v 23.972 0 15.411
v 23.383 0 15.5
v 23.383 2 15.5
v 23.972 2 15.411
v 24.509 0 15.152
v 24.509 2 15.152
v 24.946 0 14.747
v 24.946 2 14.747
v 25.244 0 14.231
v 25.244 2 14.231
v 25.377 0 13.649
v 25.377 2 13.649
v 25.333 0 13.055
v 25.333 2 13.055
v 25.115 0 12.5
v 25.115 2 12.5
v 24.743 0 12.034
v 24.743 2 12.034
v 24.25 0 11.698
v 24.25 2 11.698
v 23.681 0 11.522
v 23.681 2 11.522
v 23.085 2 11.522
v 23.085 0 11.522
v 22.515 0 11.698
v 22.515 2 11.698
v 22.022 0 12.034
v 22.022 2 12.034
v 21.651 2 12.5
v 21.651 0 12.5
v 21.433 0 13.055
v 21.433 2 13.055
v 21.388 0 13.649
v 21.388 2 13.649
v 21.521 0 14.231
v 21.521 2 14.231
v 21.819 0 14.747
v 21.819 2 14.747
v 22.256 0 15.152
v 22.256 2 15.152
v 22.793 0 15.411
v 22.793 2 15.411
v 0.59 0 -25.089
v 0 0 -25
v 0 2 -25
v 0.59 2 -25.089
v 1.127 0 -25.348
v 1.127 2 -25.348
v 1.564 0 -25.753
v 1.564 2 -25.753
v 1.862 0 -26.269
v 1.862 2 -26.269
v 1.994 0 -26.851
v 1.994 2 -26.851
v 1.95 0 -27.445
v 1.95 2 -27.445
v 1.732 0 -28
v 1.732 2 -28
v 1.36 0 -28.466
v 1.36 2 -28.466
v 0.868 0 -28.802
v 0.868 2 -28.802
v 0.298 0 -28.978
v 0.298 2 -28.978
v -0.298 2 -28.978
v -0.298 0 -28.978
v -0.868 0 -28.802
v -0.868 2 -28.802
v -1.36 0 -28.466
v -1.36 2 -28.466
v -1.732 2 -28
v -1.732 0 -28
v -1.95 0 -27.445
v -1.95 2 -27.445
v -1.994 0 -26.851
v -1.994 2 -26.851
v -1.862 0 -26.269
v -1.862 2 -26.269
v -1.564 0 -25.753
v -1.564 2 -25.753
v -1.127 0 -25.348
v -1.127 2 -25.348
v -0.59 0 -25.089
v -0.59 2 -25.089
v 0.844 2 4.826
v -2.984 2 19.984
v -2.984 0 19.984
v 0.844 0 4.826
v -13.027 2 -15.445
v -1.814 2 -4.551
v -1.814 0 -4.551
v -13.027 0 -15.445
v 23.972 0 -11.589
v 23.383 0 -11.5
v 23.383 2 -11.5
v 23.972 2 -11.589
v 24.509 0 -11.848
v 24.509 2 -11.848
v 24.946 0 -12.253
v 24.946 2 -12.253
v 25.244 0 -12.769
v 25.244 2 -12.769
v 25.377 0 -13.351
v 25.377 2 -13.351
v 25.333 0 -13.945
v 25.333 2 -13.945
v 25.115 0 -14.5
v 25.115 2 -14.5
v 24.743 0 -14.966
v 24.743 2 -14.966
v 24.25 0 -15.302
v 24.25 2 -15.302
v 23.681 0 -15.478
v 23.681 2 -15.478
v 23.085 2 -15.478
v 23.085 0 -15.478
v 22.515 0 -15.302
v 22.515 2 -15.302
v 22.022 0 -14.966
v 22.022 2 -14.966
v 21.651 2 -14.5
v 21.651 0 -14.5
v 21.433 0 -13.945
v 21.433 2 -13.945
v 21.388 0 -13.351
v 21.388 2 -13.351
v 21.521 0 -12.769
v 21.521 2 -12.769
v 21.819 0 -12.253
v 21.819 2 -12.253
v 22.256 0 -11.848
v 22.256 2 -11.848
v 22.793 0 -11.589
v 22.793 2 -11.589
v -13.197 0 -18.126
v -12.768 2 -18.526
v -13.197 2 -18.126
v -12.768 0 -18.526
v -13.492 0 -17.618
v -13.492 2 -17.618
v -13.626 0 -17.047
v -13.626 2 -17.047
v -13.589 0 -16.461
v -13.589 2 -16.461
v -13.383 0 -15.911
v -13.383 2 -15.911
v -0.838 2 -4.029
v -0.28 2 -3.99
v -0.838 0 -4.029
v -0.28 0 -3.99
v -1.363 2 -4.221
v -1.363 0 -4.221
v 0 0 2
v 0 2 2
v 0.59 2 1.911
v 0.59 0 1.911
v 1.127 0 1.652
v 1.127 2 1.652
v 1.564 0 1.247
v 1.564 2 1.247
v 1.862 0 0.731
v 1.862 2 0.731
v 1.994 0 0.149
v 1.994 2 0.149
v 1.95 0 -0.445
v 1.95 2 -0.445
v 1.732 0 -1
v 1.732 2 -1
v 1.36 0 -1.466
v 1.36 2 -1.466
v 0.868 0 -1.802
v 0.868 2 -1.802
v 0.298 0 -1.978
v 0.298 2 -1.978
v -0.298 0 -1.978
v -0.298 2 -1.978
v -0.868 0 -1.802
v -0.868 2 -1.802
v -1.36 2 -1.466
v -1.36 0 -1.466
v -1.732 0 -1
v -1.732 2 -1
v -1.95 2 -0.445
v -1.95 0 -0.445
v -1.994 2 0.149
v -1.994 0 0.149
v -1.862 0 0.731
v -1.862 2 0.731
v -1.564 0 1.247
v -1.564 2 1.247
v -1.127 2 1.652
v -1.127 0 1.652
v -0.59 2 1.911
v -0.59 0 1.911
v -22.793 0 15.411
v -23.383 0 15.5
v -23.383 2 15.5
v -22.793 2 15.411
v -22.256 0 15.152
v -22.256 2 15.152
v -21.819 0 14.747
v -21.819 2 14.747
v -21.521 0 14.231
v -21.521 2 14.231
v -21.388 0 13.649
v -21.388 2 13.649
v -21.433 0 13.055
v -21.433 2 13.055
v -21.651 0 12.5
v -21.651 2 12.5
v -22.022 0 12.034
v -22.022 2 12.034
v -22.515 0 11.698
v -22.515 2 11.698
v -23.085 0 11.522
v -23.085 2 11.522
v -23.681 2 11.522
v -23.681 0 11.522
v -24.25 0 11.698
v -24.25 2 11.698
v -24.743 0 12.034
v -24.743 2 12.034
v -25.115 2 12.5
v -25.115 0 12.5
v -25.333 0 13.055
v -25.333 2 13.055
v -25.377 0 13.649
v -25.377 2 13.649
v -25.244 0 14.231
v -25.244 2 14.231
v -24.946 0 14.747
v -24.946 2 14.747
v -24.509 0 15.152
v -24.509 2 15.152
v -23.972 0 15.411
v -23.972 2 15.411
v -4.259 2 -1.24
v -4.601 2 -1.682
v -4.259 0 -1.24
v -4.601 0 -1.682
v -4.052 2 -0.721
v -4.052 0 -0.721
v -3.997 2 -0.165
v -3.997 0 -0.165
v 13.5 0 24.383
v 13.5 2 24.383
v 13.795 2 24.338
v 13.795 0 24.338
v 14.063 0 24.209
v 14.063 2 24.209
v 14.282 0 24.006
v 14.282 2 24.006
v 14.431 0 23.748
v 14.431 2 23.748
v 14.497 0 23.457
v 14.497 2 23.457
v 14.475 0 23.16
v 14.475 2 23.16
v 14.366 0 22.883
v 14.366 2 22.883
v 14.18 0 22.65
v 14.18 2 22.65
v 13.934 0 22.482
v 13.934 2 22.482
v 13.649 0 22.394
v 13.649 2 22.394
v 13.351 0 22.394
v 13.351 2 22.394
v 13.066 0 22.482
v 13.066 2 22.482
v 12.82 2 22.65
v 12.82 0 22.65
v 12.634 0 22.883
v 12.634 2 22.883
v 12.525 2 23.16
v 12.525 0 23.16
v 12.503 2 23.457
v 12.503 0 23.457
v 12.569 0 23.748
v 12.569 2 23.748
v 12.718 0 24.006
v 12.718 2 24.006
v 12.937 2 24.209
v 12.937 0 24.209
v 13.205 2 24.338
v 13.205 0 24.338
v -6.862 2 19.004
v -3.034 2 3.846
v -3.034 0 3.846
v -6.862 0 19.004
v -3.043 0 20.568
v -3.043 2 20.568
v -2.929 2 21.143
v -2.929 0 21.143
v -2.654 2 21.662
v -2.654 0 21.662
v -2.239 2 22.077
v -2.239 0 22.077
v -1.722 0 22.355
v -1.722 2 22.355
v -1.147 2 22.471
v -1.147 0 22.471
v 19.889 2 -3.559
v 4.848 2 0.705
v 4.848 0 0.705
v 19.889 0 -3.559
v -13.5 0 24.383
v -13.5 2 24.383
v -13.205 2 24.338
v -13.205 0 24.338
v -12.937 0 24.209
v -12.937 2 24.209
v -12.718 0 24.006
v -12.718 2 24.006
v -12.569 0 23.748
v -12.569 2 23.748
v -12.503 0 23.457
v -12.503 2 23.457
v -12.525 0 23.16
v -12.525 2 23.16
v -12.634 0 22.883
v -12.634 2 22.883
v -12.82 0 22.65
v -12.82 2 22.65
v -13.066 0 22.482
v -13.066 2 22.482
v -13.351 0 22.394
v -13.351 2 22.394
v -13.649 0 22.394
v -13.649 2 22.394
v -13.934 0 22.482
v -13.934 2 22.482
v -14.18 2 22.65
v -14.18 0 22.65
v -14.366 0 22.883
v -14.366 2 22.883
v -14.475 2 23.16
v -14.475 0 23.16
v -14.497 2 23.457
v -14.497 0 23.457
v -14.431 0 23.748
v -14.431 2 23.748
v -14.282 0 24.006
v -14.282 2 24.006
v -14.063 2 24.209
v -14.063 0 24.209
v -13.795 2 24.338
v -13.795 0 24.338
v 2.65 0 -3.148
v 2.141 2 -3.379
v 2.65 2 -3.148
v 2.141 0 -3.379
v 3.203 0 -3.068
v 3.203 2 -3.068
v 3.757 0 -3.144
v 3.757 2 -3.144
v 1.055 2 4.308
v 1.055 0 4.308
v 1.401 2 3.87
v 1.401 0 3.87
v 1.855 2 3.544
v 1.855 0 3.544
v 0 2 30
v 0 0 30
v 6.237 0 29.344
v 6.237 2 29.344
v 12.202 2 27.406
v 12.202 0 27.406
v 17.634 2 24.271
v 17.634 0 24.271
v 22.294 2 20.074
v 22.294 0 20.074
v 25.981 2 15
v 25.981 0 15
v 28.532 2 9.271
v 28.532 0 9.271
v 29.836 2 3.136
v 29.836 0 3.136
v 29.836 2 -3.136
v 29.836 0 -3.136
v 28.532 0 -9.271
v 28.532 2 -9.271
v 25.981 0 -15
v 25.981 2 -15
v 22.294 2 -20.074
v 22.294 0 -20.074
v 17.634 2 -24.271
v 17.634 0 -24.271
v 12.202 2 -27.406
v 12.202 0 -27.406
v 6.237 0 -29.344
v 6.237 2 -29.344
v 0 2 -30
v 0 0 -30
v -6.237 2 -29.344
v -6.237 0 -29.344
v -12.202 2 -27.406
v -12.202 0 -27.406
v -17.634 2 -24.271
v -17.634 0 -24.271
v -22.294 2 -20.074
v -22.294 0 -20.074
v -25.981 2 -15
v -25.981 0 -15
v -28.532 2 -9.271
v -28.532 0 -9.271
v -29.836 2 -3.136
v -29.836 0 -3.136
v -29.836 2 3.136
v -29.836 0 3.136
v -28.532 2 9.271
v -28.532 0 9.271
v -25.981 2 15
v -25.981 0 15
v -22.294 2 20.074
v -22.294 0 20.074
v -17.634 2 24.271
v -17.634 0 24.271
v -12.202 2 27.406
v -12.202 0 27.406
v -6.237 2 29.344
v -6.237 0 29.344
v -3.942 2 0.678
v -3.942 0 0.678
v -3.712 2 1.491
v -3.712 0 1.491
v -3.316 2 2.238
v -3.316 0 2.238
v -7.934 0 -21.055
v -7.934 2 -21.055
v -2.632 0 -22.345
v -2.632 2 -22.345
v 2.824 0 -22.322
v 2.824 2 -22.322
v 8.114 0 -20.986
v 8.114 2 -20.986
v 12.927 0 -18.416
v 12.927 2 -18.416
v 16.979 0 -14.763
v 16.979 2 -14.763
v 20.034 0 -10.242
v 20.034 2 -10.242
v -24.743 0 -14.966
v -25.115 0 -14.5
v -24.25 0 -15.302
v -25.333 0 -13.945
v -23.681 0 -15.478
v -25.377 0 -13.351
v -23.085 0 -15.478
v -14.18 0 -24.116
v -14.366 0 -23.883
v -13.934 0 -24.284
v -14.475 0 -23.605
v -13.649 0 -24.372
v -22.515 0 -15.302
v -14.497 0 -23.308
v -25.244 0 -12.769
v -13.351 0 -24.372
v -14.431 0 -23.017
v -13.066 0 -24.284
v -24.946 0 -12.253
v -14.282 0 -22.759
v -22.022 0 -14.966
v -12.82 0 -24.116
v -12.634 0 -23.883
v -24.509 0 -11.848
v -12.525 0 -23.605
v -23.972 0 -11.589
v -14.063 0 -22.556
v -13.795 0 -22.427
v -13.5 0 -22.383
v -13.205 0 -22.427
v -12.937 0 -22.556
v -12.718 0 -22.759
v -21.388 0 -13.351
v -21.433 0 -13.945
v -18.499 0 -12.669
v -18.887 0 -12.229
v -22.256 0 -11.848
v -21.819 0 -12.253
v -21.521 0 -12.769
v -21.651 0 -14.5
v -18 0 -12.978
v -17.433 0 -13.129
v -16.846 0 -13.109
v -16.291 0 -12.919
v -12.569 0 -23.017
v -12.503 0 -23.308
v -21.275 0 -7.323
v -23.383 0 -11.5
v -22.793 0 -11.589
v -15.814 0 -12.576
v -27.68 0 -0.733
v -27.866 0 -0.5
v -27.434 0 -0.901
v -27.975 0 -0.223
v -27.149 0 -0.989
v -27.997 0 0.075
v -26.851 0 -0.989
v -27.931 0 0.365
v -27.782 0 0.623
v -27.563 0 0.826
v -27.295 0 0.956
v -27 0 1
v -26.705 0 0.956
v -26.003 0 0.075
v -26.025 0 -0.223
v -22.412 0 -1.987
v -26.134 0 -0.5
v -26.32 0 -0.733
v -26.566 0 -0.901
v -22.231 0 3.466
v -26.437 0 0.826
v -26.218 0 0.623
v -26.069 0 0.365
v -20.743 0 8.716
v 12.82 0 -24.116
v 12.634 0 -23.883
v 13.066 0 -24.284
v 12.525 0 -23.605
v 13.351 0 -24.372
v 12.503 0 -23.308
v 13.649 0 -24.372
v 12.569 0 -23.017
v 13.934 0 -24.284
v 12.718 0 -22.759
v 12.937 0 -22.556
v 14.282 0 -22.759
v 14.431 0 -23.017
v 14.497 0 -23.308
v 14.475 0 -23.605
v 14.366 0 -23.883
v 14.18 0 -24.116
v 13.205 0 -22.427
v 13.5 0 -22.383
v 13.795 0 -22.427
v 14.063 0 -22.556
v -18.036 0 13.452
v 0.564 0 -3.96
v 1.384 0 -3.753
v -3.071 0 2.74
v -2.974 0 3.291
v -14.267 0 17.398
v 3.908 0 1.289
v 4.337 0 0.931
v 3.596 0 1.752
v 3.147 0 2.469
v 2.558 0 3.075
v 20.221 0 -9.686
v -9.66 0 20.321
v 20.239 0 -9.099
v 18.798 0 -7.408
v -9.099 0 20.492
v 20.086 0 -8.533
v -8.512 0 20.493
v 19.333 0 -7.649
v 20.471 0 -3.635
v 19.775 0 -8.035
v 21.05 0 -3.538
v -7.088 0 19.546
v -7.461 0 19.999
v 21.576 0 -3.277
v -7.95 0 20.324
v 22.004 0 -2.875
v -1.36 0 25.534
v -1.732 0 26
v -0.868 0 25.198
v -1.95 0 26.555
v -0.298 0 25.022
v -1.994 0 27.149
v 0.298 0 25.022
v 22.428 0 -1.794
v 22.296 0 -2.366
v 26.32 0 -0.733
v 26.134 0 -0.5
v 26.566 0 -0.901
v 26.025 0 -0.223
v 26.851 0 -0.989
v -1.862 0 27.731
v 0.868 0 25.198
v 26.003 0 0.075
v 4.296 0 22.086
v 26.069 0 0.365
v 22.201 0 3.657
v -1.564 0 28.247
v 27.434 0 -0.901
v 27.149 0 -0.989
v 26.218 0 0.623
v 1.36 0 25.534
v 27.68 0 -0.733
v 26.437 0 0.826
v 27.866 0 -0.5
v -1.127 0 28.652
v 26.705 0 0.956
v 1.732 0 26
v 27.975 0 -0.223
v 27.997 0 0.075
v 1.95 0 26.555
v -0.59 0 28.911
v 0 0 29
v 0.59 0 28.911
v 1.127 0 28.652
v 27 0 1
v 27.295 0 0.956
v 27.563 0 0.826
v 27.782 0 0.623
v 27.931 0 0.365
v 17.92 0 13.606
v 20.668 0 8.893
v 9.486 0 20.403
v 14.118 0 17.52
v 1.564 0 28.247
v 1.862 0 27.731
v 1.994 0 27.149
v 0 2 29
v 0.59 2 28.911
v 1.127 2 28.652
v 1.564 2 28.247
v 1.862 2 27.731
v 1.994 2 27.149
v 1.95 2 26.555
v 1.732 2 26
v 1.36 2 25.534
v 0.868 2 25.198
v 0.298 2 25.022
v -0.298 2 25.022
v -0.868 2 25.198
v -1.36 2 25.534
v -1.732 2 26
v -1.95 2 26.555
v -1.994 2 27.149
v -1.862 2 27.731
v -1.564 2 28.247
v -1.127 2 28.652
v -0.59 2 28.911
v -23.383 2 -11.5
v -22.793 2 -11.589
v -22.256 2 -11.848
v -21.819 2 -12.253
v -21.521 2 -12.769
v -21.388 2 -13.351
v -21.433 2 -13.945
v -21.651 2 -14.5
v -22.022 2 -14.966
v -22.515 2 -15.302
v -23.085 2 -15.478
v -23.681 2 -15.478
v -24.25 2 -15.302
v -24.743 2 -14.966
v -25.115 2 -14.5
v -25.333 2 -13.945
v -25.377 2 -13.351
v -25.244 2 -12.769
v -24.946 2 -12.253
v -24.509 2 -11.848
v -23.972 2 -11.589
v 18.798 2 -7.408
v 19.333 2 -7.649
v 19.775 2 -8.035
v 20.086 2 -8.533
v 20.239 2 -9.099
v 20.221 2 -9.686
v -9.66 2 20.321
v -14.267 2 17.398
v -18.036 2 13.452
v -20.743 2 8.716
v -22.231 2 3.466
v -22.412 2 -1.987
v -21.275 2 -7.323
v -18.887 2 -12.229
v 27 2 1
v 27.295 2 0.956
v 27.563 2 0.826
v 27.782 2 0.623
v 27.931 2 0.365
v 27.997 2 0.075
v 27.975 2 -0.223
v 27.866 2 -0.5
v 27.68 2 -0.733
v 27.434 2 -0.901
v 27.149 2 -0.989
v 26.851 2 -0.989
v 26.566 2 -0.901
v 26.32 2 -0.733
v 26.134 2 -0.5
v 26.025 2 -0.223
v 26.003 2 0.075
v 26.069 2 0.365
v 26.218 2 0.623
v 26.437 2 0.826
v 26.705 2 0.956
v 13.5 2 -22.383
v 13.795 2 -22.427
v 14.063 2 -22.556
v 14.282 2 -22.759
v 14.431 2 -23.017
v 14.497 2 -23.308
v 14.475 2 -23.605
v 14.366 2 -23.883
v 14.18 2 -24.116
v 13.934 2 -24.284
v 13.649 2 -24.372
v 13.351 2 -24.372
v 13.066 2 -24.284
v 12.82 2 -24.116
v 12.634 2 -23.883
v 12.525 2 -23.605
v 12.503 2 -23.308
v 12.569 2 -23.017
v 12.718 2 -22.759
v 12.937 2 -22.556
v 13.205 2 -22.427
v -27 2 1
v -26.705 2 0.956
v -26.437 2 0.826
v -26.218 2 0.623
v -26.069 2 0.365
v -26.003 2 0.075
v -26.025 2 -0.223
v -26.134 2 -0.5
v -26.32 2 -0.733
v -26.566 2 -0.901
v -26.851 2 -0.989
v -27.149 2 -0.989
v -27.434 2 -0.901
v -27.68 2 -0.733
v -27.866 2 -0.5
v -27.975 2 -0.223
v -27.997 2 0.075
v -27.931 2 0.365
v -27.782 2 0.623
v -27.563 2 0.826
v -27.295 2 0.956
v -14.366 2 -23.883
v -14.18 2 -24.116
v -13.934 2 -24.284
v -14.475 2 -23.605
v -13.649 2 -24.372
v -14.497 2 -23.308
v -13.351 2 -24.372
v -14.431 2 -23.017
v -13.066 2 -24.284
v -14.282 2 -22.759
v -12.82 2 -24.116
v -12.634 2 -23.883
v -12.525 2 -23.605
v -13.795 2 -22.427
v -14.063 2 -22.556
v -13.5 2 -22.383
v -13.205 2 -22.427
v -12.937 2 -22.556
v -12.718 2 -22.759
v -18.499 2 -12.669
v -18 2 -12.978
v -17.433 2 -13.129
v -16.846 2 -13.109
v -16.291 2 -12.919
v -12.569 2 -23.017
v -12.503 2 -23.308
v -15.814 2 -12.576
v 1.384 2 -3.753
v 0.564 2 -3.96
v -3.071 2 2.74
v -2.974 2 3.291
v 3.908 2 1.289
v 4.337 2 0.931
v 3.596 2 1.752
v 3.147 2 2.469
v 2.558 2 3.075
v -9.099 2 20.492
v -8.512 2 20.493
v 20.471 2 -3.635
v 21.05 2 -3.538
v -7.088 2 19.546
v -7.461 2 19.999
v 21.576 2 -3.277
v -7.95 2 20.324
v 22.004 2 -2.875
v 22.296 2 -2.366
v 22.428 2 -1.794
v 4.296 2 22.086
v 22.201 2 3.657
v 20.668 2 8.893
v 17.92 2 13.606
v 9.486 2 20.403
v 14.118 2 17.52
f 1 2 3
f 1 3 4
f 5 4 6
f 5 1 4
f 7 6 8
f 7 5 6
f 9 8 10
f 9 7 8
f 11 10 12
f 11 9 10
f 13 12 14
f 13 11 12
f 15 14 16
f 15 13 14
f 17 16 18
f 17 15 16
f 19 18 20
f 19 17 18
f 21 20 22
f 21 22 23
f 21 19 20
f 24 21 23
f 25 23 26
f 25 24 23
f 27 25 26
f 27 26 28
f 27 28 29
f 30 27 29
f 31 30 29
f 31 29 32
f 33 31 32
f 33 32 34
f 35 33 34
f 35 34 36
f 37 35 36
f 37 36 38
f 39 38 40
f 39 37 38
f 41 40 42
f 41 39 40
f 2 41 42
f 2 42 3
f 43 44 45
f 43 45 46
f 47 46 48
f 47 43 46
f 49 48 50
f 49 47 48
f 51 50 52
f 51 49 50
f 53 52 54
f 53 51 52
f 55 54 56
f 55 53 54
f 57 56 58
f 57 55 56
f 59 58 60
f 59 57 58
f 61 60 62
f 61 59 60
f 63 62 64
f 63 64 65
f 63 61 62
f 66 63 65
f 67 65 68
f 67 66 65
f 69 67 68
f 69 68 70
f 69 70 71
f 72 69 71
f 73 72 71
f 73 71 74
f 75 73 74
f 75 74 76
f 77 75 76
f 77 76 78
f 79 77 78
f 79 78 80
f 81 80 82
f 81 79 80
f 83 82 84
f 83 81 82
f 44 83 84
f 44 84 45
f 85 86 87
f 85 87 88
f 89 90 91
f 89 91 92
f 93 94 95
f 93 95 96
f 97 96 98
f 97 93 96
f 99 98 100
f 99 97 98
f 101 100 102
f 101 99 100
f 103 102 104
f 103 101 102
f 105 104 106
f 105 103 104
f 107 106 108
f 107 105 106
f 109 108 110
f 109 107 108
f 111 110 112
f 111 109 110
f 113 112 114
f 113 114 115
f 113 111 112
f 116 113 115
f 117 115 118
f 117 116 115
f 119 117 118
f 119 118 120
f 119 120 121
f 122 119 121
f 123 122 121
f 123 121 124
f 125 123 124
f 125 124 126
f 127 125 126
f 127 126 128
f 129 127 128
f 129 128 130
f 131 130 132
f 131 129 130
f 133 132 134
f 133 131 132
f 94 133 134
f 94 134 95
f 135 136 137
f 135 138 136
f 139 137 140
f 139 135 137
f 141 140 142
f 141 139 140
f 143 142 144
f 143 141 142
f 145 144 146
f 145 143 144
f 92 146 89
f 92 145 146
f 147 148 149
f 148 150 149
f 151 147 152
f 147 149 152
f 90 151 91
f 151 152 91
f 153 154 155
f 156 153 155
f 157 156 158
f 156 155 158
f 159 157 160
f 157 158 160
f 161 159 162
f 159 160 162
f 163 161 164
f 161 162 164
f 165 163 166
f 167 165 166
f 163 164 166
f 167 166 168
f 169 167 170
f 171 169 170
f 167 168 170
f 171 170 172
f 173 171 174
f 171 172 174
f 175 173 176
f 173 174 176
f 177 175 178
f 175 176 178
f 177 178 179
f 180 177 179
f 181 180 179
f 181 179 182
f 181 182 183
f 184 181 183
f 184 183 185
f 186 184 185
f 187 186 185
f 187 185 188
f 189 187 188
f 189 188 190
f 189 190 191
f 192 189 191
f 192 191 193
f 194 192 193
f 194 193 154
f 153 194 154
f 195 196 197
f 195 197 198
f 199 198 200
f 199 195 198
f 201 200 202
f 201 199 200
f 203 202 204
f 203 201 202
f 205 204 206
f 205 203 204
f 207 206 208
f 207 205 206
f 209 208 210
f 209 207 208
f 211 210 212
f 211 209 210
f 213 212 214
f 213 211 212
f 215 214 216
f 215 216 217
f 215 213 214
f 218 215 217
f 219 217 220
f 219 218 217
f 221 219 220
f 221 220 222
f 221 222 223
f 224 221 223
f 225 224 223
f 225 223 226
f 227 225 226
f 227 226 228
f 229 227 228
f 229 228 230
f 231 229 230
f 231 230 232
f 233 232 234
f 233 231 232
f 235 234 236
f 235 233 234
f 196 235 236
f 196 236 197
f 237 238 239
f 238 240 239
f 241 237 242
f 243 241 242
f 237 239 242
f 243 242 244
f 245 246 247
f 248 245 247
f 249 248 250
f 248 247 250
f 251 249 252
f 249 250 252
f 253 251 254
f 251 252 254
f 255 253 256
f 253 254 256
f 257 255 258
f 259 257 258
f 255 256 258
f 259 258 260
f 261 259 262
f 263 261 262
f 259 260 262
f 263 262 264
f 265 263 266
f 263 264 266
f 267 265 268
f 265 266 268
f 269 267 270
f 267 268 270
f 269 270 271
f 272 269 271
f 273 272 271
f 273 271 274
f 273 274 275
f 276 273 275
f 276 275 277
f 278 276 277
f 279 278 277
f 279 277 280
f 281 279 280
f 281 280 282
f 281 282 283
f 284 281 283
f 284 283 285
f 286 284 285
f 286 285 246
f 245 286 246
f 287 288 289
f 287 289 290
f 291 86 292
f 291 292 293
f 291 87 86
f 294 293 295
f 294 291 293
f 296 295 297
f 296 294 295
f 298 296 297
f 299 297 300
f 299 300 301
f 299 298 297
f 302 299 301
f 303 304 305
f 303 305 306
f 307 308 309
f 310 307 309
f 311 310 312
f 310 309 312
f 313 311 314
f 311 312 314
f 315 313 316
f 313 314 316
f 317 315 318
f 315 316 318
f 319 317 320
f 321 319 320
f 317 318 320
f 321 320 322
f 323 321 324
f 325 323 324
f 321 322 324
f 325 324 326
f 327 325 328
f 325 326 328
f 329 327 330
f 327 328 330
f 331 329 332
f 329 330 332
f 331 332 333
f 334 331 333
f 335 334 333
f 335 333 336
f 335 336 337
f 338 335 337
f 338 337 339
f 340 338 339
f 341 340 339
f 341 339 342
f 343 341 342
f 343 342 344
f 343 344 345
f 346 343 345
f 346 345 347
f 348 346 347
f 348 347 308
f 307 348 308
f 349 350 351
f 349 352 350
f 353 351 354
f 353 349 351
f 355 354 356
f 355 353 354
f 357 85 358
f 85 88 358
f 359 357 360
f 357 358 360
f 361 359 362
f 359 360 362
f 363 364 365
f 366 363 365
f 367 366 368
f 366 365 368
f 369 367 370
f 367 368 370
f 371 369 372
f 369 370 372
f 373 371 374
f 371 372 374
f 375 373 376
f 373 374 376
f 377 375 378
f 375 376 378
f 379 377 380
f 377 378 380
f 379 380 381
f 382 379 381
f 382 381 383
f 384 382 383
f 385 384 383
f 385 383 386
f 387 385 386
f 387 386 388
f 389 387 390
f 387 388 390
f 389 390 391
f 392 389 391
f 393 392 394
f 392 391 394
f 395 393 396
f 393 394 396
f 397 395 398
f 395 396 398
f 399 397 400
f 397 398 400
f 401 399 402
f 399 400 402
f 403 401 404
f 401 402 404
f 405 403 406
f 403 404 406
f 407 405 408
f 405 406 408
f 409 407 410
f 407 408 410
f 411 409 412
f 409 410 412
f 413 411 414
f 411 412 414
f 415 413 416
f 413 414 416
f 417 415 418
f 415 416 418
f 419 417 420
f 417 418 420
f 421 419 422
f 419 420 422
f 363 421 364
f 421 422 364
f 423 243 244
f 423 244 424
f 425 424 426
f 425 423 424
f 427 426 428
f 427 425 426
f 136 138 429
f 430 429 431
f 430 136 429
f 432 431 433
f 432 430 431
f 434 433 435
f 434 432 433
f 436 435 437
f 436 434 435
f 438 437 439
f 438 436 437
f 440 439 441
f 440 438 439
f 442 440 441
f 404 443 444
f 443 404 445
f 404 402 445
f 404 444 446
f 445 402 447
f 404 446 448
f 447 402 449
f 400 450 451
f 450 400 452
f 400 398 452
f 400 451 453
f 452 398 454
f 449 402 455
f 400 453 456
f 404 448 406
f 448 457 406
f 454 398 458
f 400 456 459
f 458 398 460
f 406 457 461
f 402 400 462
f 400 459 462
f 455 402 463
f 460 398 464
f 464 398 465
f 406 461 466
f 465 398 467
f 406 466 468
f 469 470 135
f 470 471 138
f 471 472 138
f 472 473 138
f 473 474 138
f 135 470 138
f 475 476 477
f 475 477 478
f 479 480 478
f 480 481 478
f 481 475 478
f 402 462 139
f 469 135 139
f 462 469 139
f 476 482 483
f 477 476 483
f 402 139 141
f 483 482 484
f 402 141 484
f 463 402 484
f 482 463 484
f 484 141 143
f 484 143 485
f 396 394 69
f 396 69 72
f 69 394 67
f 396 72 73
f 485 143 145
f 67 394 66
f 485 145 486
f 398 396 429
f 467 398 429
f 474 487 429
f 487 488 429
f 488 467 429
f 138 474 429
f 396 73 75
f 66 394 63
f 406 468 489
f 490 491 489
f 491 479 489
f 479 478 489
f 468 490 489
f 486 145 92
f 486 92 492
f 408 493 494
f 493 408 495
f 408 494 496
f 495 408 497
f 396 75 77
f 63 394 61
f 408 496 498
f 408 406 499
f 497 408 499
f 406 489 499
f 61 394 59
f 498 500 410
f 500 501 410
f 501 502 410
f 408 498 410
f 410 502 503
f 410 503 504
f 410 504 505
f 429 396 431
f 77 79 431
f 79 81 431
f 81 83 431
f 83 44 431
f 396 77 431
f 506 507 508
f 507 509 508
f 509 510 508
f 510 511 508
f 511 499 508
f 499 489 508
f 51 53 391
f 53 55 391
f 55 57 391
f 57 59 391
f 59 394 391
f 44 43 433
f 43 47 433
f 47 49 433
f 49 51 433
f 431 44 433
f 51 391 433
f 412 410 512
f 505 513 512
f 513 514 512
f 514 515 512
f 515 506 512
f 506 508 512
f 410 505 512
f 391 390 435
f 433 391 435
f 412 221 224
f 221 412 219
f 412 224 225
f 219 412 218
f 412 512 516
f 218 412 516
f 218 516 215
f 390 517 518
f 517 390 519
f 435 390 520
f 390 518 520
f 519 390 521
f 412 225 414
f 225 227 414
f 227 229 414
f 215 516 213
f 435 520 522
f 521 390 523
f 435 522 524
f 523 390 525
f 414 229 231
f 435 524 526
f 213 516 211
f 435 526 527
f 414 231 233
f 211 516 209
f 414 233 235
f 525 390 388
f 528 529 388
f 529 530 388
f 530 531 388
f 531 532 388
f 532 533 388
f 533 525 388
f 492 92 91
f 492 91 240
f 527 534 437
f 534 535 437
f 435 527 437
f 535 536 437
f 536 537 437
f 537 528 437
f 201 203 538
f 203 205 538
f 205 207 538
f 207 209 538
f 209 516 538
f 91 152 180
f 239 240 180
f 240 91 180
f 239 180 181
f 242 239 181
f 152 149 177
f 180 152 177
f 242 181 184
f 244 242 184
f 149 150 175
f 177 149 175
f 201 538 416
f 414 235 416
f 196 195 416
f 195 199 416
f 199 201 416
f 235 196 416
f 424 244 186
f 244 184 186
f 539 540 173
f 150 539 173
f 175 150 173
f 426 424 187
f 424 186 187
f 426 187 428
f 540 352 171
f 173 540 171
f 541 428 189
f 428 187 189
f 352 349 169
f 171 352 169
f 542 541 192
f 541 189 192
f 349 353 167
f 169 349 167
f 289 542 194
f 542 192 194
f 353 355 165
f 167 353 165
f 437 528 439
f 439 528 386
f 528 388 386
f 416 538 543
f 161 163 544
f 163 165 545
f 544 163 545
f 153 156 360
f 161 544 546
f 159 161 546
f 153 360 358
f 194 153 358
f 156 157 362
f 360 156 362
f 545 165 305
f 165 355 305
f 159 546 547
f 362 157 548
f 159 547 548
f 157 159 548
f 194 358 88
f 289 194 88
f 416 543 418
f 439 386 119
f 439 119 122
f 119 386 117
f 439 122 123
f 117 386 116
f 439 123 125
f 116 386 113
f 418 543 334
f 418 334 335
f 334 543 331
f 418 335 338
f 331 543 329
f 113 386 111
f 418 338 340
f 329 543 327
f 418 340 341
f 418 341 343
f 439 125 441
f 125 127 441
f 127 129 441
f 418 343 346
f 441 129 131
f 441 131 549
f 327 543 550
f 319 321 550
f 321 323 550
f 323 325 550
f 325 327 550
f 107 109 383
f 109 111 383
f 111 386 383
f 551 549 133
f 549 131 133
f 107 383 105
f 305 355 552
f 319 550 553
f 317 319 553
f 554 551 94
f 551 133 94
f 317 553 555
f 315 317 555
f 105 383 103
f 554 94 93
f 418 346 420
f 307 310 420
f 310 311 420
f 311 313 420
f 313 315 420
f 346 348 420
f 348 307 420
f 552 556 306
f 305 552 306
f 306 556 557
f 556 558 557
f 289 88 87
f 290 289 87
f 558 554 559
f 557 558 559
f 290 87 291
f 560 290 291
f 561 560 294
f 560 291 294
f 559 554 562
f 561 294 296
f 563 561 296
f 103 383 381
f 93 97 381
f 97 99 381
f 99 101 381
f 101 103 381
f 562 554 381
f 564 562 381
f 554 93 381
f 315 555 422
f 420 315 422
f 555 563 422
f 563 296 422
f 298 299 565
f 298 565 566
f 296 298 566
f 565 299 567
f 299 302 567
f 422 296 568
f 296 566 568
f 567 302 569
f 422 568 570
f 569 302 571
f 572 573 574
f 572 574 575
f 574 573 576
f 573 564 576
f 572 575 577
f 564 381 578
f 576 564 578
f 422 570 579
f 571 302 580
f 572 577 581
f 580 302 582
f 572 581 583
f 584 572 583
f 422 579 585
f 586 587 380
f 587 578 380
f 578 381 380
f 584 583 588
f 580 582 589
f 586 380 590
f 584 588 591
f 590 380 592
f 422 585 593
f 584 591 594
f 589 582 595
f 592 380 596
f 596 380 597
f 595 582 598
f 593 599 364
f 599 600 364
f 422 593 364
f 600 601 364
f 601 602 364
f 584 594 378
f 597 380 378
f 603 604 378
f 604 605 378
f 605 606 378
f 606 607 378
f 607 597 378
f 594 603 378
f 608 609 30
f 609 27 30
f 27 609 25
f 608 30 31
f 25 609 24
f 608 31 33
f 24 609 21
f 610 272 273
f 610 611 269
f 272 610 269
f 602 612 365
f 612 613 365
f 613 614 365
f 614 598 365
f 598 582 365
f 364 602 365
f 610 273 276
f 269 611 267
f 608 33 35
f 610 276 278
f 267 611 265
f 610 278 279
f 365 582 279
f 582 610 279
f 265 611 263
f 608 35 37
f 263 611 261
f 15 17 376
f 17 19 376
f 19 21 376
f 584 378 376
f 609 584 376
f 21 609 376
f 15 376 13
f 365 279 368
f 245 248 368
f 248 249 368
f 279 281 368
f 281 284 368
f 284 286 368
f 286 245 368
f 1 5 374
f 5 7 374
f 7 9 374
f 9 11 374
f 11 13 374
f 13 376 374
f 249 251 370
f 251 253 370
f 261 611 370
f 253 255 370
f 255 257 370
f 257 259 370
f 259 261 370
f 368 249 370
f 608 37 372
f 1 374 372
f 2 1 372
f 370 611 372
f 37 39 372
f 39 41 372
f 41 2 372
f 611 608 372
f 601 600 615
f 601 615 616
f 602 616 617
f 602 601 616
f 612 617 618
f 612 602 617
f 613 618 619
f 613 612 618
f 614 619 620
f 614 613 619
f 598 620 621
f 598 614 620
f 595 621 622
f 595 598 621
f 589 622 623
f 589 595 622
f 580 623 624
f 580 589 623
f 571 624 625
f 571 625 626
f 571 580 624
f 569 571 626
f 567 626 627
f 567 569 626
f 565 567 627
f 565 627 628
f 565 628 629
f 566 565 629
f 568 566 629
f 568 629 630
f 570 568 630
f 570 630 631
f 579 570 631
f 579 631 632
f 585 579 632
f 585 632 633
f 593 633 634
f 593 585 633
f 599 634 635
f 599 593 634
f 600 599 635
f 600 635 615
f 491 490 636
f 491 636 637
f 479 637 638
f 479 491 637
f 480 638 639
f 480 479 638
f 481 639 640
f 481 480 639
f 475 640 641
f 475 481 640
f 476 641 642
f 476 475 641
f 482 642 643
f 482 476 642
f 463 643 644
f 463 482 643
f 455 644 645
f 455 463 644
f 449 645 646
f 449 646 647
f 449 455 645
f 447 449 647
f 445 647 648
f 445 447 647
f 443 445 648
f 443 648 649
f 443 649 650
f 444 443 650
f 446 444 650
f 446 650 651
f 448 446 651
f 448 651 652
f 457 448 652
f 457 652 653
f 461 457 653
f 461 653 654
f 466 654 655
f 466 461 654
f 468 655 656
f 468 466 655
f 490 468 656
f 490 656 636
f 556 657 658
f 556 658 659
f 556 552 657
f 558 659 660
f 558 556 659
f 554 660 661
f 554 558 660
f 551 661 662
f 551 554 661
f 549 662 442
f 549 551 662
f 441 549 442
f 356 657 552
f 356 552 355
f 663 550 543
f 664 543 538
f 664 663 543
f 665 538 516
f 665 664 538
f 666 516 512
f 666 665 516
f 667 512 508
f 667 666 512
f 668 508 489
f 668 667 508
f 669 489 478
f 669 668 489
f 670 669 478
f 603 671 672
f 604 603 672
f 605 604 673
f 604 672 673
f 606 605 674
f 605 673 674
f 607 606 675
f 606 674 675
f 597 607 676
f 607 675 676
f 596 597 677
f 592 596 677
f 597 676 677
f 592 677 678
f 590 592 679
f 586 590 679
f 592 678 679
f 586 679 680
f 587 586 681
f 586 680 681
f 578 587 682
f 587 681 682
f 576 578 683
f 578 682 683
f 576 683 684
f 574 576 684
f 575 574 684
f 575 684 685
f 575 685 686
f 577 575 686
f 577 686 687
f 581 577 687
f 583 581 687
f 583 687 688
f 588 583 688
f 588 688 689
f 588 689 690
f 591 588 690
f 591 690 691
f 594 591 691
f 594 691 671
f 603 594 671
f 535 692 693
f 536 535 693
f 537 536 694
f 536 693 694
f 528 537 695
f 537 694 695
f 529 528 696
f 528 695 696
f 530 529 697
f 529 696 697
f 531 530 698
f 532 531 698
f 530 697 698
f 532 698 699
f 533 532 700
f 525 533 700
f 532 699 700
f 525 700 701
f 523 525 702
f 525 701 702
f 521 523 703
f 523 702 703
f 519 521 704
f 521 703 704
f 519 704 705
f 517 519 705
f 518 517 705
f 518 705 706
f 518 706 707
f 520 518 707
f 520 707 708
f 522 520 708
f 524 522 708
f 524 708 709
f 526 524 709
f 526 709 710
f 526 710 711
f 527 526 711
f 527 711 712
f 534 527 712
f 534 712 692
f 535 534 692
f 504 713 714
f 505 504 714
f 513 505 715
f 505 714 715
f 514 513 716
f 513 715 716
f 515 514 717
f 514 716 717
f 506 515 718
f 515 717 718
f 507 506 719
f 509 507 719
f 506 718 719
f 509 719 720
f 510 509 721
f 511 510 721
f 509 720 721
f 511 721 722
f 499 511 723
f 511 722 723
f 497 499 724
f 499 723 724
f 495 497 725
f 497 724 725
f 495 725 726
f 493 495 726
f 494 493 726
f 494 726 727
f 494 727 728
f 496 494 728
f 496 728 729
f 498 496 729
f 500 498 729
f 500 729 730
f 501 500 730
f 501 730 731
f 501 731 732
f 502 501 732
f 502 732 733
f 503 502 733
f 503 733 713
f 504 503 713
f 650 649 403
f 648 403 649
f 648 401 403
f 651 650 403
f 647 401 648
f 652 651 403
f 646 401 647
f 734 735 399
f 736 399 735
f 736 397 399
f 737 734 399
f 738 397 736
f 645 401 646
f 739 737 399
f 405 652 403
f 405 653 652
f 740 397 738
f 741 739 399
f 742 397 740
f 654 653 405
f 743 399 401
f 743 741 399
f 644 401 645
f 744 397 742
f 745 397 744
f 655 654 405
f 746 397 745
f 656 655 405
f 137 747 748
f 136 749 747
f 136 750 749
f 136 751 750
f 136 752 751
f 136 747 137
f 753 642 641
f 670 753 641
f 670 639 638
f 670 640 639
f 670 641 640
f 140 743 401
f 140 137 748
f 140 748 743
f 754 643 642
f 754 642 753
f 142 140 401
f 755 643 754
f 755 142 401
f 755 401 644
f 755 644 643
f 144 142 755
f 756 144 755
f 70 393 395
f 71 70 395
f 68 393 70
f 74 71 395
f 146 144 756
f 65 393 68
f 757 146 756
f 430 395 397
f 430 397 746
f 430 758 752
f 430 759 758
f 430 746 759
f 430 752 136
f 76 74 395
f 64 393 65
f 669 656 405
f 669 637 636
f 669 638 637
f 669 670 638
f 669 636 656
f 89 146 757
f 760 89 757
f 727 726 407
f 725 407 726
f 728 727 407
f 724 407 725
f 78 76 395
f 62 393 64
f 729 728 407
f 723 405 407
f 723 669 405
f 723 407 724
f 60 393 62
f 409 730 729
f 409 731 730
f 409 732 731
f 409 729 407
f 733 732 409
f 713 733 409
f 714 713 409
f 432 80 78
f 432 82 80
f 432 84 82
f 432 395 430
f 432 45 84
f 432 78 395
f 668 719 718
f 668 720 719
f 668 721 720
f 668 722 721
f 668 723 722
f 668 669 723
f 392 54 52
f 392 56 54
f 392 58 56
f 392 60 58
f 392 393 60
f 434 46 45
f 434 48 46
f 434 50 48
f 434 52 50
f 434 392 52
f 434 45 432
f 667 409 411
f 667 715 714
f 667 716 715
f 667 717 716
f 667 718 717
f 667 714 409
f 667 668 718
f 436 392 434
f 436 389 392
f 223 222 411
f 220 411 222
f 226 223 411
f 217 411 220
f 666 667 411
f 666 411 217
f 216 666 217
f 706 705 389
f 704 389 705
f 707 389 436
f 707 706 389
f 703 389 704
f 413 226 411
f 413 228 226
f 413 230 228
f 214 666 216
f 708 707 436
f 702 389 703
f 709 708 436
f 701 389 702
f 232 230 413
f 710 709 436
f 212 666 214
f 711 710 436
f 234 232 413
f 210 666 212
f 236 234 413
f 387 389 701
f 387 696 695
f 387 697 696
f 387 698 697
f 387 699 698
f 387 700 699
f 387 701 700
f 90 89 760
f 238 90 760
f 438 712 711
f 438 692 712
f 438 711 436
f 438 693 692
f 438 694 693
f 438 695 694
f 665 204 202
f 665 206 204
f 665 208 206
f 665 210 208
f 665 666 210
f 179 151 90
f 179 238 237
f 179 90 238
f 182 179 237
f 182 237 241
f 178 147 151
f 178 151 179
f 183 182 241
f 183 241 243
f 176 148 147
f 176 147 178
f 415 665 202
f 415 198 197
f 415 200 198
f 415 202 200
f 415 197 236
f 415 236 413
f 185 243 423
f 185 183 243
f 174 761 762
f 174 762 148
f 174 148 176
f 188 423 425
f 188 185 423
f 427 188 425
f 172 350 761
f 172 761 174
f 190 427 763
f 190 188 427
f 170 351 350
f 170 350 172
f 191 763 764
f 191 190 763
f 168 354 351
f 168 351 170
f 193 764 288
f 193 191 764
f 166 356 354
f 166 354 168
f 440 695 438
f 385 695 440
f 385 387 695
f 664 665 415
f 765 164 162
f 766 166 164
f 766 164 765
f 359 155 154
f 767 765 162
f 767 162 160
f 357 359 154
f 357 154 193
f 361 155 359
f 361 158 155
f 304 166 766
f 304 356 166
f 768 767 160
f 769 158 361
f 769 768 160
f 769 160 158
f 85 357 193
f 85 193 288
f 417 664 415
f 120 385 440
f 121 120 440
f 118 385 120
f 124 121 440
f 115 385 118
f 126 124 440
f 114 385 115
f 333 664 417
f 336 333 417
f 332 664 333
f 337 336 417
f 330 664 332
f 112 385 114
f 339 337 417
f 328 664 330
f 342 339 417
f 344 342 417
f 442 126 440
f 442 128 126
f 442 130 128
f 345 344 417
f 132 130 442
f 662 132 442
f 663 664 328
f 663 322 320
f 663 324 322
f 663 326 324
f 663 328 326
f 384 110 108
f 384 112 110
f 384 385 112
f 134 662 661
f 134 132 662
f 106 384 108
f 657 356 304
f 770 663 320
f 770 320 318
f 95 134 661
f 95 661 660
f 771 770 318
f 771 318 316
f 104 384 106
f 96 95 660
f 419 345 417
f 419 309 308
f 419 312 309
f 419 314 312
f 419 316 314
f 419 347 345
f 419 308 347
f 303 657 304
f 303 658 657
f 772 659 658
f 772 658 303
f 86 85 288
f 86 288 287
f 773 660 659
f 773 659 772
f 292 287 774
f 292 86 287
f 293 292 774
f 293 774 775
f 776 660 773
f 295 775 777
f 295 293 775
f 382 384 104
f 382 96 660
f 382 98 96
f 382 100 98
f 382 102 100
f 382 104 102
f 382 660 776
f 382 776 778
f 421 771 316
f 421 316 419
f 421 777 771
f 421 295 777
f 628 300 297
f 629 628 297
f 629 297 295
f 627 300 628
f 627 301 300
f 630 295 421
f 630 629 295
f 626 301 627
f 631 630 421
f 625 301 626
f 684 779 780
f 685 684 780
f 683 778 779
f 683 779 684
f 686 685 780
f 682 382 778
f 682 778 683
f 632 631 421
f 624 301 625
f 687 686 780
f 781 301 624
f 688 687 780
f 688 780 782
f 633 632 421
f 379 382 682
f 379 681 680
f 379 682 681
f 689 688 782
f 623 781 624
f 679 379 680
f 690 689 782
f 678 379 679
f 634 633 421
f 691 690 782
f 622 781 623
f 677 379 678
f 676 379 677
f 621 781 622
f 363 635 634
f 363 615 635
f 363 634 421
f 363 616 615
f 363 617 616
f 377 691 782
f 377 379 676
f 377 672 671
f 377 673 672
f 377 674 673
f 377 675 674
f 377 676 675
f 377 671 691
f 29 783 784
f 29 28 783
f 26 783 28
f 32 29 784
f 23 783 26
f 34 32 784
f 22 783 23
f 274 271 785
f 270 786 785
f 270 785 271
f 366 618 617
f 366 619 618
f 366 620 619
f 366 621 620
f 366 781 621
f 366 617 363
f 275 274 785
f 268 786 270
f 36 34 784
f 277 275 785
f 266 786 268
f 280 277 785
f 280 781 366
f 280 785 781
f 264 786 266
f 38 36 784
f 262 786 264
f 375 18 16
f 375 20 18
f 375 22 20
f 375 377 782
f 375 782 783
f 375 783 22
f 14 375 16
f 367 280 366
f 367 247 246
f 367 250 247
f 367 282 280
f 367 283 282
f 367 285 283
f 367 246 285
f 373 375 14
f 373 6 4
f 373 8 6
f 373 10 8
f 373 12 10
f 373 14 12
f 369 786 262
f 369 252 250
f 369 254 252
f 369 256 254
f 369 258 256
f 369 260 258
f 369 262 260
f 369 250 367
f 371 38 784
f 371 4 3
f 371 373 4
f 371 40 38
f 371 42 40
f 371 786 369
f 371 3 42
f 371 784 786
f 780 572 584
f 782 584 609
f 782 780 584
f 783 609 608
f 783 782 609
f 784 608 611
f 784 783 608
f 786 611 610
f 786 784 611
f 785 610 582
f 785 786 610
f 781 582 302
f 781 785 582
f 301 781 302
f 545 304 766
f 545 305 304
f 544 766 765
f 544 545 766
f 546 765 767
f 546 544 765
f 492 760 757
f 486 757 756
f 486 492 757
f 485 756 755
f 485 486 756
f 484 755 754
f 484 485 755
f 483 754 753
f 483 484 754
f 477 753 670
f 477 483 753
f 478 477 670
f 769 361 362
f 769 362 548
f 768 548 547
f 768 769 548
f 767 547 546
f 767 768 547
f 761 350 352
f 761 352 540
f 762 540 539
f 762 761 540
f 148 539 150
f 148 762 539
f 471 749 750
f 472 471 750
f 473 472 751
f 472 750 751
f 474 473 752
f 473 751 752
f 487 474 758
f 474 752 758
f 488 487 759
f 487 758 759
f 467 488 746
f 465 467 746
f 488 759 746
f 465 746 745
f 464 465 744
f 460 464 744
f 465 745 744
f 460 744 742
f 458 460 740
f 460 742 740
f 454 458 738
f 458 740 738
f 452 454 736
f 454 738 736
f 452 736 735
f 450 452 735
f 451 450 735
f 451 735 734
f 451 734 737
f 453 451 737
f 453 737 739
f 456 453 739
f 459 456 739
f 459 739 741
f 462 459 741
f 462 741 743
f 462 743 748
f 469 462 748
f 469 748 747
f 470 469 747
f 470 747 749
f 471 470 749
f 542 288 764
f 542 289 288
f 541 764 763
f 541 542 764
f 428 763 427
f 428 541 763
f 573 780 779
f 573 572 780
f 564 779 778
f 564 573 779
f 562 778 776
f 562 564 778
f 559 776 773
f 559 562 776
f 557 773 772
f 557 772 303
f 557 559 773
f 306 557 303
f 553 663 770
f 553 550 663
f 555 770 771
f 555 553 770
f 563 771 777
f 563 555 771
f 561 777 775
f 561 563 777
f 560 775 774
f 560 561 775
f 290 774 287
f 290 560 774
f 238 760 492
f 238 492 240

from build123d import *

# Parameters (mm, degrees)
SKETCH1_R                = 30
SKETCH1_R_2              = 2
BOSS_EXTRUDE1_DEPTH      = 2
SKETCH3_R                = 1
CUT_EXTRUDE1_DEPTH       = 3
SKETCH4_R                = 2
CUT_EXTRUDE2_DEPTH       = 10
FILLET1_R                = 2
CIRPATTERN1_COUNT        = 3
FILLET1_OF_CIRPATTERN1_R = 2


with BuildPart() as part:
    # Sketch1 → Boss-Extrude1 (new body)
    with BuildSketch(Plane(origin=(0, 0, 0), x_dir=(1, 0, 0), z_dir=(0, 1, 0))):
        with Locations(Location((0, 0, 0), (0, 0, 270))):
            Circle(SKETCH1_R)
        with Locations(Location((0, 27, 0), (0, 0, 270))):
            Circle(SKETCH1_R_2, mode=Mode.SUBTRACT)
        with Locations(Location((23.382685902, 13.5, 0), (0, 0, 270))):
            Circle(SKETCH1_R_2, mode=Mode.SUBTRACT)
        with Locations(Location((23.382685902, -13.5, 0), (0, 0, 270))):
            Circle(SKETCH1_R_2, mode=Mode.SUBTRACT)
        with Locations(Location((0, -27, 0), (0, 0, 270))):
            Circle(SKETCH1_R_2, mode=Mode.SUBTRACT)
        with Locations(Location((-23.382685902, -13.5, 0), (0, 0, 270))):
            Circle(SKETCH1_R_2, mode=Mode.SUBTRACT)
        with Locations(Location((-23.382685902, 13.5, 0), (0, 0, 270))):
            Circle(SKETCH1_R_2, mode=Mode.SUBTRACT)
    extrude(amount=BOSS_EXTRUDE1_DEPTH)

    # Sketch3 → Cut-Extrude1 (cut)
    with BuildSketch(Plane(origin=(0, 2, 0), x_dir=(1, 0, 0), z_dir=(0, 1, 0))):
        with Locations(Location((-13.5, 23.382685902, 0), (0, 0, 270))):
            Circle(SKETCH3_R)
        with Locations(Location((13.5, 23.382685902, 0), (0, 0, 270))):
            Circle(SKETCH3_R)
        with Locations(Location((27, 0, 0), (0, 0, 270))):
            Circle(SKETCH3_R)
        with Locations(Location((13.5, -23.382685902, 0), (0, 0, 270))):
            Circle(SKETCH3_R)
        with Locations(Location((-13.5, -23.382685902, 0), (0, 0, 270))):
            Circle(SKETCH3_R)
        with Locations(Location((-27, 0, 0), (0, 0, 270))):
            Circle(SKETCH3_R)
    extrude(amount=-CUT_EXTRUDE1_DEPTH, mode=Mode.SUBTRACT)

    # Sketch4 → Cut-Extrude2 (cut)
    with BuildSketch(Plane(origin=(0, 2, 0), x_dir=(1, 0, 0), z_dir=(0, 1, 0))):
        with Locations(Location((0, 0, 0), (0, 0, 270))):
            Circle(SKETCH4_R)
        with BuildLine():
            Line((-1.09088921, 3.848371179), (-14.680142304, 17.051200014))
            ThreePointArc((-14.680142304, 17.051200014), (5.509393992, 21.815053927), (21.015954319, 8.036147338))
            Line((21.015954319, 8.036147338), (2.787342599, 2.868923358))
            ThreePointArc((2.787342599, 2.868923358), (0.979447821, 3.878231809), (-1.09088921, 3.848371179))
        make_face()
    cut_extrude2 = extrude(amount=-CUT_EXTRUDE2_DEPTH, mode=Mode.SUBTRACT)

    # Fillet1
    fillet1_edges = [part.edges().sort_by_distance(p)[0] for p in [
        (2.787342599, 1, -2.868923358),
        (-1.09088921, 1, -3.848371179),
        (-14.680142304, 1, -17.051200014),
        (21.015954319, 1, -8.036147338),
    ]]
    fillet(fillet1_edges, radius=FILLET1_R)

    # CirPattern1: Cut-Extrude2 ×3 about axis
    cirpattern1_axis = Axis((0, 0, 0), (0, 1, 0))
    for i in range(1, CIRPATTERN1_COUNT):
        add(cut_extrude2.rotate(cirpattern1_axis, i * 360 / CIRPATTERN1_COUNT), mode=Mode.SUBTRACT)

    # Fillet1 of CirPattern1
    fillet1_of_cirpattern1_edges = [part.edges().sort_by_distance(p)[0] for p in [
        (-3.878231809, 1, -0.979447821),
        (-2.787342599, 1, 2.868923358),
        (-7.426701225, 1, 21.238976174),
        (-17.467484903, 1, -14.182276656),
        (1.09088921, 1, 3.848371179),
        (3.878231809, 1, 0.979447821),
        (22.10684353, 1, -4.187776159),
        (-3.548469416, 1, 22.218423995),
    ]]
    fillet(fillet1_of_cirpattern1_edges, radius=FILLET1_OF_CIRPATTERN1_R)


solid = part.part
